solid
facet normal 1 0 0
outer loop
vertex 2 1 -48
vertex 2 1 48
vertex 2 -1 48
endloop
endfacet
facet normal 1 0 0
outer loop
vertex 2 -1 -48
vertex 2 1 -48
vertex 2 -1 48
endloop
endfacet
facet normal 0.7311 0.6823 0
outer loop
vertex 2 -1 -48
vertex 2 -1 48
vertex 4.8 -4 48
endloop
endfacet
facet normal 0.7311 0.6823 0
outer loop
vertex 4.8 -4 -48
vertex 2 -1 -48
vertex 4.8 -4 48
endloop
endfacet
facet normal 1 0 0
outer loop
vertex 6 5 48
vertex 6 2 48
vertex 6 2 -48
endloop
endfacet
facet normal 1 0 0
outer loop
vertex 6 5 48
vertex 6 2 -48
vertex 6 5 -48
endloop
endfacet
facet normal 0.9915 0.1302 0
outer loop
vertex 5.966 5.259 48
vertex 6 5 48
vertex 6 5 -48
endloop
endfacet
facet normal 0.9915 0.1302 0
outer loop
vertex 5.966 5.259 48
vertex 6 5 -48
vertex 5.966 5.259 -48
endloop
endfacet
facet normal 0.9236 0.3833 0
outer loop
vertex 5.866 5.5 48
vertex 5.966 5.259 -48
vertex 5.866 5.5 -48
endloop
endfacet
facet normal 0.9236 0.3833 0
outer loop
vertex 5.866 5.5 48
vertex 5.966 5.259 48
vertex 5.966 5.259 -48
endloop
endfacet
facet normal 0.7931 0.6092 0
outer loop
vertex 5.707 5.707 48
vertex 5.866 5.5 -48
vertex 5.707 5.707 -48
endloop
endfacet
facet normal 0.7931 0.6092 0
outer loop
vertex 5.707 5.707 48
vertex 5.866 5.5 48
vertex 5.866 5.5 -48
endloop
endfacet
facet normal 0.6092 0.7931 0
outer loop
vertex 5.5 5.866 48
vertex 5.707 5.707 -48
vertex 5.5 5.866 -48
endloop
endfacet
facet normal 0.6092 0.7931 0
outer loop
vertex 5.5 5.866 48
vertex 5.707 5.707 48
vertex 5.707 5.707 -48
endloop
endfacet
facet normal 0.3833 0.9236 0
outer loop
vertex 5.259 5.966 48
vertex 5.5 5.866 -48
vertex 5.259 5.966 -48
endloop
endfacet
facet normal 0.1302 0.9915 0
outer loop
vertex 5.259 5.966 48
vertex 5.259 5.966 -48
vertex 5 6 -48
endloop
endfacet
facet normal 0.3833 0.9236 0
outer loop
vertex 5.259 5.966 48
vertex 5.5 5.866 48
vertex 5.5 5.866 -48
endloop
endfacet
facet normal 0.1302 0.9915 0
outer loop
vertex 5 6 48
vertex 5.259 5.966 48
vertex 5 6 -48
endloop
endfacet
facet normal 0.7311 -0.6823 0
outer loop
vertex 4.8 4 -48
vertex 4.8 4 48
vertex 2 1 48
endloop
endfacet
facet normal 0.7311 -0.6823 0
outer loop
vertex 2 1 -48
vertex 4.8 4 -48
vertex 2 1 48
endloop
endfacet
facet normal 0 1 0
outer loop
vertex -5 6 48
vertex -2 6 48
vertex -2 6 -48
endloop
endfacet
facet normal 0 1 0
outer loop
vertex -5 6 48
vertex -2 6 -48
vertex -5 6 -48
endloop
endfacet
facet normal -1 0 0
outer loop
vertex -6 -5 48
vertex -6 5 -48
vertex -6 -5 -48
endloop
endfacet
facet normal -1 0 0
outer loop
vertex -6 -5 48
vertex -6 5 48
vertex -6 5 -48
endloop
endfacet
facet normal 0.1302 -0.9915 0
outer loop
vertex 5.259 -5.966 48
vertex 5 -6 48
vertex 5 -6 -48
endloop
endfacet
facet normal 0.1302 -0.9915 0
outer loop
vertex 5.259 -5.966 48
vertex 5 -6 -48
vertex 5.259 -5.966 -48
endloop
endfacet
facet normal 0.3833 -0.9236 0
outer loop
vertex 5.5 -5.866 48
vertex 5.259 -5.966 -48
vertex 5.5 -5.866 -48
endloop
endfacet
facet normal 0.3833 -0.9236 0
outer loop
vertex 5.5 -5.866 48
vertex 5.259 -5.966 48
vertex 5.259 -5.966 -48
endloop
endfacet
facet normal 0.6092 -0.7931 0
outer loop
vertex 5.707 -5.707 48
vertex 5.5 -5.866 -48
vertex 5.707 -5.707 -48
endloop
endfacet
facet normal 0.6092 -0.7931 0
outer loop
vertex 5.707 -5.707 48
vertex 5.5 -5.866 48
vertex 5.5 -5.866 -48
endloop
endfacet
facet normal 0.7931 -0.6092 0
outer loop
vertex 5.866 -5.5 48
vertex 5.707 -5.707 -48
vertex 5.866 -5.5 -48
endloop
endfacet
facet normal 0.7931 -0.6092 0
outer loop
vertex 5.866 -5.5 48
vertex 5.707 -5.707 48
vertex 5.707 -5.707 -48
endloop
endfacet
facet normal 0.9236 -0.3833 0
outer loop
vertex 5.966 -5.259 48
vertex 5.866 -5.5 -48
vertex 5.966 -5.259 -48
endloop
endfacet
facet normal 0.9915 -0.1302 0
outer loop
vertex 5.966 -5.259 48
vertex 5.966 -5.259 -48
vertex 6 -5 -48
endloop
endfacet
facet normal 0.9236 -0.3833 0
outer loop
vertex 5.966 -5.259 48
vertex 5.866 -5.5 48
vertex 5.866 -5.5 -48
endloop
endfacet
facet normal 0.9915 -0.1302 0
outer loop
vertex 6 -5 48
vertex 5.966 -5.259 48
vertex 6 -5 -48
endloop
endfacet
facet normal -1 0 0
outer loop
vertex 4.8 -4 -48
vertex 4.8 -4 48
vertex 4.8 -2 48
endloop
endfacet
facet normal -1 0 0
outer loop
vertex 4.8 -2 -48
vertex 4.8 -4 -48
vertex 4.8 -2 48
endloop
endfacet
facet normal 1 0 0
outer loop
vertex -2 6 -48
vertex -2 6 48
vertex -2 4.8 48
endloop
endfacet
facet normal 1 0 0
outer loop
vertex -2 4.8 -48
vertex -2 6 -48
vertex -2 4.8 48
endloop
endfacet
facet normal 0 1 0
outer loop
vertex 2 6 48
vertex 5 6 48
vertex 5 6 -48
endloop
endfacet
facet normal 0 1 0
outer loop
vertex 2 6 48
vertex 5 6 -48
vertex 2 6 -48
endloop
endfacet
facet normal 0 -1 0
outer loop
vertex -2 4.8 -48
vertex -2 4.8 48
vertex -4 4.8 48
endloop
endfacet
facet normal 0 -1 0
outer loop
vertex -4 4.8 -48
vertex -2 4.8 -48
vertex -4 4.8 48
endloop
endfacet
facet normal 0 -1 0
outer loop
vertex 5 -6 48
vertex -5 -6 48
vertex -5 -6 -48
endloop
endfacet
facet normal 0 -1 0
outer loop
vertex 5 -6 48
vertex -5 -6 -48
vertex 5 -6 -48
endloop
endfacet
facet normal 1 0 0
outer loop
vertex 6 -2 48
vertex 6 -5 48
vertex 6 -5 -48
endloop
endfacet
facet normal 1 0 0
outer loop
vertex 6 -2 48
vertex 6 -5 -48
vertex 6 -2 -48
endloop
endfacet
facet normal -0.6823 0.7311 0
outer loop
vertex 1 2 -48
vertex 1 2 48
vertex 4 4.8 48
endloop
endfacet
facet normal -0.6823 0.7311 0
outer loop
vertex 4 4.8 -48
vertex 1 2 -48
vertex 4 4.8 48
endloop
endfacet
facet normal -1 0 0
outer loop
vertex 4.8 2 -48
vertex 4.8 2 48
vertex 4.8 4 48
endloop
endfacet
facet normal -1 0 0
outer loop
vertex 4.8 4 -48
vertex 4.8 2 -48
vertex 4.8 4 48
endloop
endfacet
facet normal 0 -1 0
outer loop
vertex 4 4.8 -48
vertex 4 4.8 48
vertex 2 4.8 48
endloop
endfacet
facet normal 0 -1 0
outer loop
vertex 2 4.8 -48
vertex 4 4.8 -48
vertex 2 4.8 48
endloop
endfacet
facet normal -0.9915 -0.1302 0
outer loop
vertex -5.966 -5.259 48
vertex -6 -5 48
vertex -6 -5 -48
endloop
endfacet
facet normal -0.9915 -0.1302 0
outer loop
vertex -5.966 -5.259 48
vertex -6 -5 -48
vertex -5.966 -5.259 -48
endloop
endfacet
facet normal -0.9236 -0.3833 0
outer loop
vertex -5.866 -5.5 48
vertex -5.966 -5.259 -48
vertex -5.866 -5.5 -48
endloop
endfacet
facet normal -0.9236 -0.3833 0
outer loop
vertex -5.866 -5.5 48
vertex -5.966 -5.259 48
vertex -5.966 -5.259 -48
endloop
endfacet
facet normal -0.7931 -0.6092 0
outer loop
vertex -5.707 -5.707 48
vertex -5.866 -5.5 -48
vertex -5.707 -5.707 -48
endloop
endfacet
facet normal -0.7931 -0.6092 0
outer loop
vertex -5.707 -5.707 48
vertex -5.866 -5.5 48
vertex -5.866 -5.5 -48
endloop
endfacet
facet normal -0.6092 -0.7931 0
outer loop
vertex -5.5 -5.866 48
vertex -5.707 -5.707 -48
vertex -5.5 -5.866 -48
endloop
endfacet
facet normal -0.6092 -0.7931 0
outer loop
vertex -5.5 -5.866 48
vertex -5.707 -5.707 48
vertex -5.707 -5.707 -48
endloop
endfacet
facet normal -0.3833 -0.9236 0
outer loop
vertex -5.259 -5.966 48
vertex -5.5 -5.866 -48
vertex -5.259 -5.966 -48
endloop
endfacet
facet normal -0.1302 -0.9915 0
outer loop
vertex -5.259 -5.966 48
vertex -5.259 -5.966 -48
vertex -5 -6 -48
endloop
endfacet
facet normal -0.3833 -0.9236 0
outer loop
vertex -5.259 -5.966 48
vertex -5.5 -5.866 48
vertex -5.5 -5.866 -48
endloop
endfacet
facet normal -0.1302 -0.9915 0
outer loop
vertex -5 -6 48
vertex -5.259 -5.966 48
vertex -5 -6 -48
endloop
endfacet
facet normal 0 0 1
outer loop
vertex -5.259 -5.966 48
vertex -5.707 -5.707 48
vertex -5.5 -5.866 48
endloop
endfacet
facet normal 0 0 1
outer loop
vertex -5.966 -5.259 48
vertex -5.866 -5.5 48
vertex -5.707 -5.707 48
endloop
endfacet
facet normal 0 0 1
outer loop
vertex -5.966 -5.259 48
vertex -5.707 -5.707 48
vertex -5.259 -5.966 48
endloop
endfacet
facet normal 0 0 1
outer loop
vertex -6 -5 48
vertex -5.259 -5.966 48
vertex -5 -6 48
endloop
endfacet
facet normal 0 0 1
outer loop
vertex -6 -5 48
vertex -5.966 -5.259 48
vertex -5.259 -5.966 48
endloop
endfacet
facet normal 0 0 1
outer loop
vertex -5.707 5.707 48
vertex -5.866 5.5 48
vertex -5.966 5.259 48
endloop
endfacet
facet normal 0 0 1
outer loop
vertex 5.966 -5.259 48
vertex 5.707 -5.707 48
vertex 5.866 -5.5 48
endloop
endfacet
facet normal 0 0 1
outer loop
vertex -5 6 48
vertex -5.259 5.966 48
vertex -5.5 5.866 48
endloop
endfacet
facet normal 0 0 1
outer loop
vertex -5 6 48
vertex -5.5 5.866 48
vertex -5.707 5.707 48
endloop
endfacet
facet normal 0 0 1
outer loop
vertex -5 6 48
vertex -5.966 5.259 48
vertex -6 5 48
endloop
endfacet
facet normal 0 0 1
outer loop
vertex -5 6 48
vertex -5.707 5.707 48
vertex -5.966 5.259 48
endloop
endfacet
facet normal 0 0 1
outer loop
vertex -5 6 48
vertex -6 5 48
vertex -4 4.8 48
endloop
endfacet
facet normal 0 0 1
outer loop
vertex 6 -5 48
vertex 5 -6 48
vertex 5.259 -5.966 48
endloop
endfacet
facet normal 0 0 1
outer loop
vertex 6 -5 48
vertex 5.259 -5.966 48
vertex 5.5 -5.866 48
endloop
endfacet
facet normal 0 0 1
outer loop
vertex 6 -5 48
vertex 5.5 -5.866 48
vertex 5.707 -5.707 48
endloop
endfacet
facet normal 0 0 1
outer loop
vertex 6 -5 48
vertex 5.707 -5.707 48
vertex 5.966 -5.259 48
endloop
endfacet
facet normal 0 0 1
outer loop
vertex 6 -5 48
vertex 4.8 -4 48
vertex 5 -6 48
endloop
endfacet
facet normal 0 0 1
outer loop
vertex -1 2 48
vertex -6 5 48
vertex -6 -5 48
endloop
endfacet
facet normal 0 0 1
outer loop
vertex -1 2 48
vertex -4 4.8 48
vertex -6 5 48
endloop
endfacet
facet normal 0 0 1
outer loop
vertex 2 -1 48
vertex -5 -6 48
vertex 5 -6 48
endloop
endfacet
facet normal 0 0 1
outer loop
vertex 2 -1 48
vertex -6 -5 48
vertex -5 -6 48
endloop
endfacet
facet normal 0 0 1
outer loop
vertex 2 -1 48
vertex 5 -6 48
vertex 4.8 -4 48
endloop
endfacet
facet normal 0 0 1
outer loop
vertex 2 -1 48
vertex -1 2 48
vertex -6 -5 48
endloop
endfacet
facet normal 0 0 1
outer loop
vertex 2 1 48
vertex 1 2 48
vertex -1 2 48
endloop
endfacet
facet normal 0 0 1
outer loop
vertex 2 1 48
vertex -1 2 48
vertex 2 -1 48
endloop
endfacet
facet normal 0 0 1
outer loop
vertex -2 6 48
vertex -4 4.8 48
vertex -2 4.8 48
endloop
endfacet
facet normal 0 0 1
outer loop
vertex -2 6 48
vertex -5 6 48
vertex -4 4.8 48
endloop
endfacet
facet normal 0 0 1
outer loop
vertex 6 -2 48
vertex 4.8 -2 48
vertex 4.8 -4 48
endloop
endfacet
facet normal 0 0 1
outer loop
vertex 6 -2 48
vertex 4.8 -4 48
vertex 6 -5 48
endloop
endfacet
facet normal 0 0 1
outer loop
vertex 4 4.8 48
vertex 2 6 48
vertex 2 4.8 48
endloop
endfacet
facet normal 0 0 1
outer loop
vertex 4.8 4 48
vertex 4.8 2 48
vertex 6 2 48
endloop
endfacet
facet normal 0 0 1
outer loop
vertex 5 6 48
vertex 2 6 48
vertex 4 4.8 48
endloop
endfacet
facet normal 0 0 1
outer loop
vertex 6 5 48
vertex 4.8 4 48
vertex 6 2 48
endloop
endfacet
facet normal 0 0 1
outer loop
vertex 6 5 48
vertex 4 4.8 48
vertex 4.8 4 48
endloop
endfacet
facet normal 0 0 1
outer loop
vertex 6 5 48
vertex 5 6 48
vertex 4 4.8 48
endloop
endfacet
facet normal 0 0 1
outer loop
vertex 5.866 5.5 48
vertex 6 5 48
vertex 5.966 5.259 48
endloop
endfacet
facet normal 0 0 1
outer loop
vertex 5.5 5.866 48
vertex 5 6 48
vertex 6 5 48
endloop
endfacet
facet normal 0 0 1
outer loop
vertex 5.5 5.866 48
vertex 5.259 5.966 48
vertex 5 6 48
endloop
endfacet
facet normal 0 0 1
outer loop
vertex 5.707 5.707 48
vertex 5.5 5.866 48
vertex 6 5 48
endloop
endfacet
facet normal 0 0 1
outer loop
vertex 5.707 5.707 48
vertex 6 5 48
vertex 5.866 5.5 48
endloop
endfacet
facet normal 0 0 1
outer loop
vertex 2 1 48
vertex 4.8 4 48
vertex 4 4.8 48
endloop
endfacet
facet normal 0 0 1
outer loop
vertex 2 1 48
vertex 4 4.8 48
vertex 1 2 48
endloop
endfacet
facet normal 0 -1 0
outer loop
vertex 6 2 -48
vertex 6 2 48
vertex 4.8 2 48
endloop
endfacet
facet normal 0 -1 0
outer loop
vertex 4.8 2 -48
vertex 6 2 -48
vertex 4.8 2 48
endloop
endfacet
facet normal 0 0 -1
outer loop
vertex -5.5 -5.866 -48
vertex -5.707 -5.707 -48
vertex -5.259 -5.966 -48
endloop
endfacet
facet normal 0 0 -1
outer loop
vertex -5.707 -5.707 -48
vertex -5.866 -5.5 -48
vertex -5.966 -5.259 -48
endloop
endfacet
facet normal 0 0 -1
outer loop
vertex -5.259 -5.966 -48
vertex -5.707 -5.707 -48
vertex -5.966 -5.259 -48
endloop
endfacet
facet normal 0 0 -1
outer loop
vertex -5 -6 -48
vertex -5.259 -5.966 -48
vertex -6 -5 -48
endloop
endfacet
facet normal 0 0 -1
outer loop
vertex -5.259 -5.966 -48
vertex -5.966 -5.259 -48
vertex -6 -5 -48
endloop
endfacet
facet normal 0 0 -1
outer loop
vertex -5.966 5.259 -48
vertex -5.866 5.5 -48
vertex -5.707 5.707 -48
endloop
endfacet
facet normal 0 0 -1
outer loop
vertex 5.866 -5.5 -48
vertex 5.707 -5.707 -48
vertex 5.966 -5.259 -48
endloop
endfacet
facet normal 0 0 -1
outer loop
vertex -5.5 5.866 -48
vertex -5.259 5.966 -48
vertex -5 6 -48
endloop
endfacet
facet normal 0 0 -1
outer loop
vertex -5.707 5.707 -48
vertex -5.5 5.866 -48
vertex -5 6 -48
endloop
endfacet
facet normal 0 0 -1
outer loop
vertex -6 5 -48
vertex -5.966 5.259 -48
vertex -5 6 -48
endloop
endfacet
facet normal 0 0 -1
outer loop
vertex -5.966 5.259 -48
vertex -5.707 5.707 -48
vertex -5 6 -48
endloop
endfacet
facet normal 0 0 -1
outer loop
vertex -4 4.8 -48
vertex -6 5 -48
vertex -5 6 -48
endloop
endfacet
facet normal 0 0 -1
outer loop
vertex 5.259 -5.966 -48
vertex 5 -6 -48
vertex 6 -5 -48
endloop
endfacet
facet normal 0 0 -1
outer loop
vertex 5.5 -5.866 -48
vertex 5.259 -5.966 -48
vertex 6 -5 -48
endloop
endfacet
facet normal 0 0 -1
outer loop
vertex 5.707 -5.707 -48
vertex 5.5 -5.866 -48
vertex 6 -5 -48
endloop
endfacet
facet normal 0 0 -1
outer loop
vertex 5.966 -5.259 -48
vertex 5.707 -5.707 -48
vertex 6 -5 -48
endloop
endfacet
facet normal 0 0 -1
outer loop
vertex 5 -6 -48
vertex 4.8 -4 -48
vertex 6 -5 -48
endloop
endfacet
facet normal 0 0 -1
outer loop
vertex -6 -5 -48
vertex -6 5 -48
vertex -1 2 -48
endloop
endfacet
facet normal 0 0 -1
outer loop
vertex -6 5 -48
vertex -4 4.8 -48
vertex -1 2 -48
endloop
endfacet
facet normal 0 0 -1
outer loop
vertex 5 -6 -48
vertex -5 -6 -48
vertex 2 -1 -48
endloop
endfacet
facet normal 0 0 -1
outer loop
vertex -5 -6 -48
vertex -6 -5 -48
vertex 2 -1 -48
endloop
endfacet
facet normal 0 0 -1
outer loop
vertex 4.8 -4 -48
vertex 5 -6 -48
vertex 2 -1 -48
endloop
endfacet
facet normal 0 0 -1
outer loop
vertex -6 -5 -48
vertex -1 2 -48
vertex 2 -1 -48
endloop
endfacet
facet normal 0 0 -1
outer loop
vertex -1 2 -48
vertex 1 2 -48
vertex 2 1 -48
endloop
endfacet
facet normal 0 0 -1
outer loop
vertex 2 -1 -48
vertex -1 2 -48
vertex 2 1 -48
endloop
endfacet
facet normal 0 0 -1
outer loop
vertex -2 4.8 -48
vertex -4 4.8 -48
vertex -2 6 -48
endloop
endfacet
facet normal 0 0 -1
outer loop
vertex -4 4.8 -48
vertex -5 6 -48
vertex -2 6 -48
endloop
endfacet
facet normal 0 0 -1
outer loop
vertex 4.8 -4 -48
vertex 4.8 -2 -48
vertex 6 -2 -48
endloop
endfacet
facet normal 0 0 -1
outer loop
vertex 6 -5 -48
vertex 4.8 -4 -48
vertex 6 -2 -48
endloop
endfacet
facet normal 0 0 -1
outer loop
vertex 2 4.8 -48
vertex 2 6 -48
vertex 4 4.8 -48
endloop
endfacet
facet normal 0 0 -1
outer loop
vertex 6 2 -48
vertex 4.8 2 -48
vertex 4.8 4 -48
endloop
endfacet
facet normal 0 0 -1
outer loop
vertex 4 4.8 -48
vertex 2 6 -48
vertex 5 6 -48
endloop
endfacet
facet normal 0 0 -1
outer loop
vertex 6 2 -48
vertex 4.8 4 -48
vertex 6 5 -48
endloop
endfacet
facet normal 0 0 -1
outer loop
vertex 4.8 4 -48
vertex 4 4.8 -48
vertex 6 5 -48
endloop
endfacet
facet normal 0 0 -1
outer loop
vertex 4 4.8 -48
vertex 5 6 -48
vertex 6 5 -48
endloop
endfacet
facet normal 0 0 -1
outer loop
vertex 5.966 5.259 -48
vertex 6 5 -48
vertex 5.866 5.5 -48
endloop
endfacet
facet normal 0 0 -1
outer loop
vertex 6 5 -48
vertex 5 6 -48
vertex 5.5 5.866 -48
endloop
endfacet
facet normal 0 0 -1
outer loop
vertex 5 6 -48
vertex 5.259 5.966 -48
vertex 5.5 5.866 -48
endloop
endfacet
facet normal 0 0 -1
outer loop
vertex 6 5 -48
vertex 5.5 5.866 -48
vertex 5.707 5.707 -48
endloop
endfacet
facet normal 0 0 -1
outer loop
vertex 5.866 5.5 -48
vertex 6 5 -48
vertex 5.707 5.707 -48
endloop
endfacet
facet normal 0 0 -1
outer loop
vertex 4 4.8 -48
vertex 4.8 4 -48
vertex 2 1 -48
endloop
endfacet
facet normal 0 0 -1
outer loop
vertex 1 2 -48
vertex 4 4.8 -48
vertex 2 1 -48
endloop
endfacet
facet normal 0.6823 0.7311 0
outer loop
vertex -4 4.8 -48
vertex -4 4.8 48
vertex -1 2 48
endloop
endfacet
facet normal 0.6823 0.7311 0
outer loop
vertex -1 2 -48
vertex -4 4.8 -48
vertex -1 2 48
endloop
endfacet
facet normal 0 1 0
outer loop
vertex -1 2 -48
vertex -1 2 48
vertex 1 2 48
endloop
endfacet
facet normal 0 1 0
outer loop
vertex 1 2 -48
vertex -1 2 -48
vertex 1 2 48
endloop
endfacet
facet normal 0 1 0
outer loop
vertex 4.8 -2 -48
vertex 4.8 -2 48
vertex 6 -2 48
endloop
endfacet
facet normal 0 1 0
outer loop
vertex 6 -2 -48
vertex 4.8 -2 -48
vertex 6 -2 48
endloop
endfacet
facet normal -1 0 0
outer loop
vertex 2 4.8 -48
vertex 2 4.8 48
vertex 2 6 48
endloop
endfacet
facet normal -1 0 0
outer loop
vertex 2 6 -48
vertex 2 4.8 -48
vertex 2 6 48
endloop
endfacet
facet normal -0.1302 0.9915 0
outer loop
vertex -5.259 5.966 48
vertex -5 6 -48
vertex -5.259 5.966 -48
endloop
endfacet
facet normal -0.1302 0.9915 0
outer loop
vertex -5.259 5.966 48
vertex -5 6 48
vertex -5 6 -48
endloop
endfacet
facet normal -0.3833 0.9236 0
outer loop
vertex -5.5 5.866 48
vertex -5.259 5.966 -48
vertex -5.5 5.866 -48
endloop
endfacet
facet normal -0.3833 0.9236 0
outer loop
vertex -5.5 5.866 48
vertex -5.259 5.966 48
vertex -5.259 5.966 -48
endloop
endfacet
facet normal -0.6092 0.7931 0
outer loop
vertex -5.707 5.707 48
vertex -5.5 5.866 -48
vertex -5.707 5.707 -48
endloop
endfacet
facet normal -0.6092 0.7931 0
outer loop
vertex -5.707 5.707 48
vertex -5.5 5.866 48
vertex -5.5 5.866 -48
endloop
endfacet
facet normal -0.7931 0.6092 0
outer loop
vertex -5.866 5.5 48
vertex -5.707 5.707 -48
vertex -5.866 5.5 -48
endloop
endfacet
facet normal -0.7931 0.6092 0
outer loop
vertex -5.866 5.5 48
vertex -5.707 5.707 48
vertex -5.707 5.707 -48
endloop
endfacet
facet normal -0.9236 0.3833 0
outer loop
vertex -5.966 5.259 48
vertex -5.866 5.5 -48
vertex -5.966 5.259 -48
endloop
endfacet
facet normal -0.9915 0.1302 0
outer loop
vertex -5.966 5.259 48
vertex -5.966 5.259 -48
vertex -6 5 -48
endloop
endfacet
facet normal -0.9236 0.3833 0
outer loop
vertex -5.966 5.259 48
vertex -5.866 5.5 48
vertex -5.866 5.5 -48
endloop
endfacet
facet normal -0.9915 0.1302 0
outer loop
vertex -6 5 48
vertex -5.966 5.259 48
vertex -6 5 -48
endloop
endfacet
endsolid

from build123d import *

# Parameters (mm, degrees)
EXTRUSION1_DEPTH             = 48
ENL_V_MAT_EXTRU_1_DEPTH      = 97.374270425
R_P_TITION_CIRCULAIRE1_COUNT = 2
R_P_TITION_CIRCULAIRE1_ANGLE = 90


with BuildPart() as part:
    # Esquisse1 → Extrusion1 (new, symmetric)
    with BuildSketch(Plane.XY):
        with BuildLine():
            Line((-6, 5), (-6, -5))
            ThreePointArc((-6, -5), (-5.707106781, -5.707106781), (-5, -6))
            Line((-5, -6), (5, -6))
            ThreePointArc((5, -6), (5.707106781, -5.707106781), (6, -5))
            Line((6, -5), (6, 5))
            ThreePointArc((6, 5), (5.707106781, 5.707106781), (5, 6))
            Line((5, 6), (-5, 6))
            ThreePointArc((-5, 6), (-5.707106781, 5.707106781), (-6, 5))
        make_face()
    extrude(amount=EXTRUSION1_DEPTH, both=True)

    # Esquisse3 → Enlèv. mat.-Extru.1 (cut, through all)
    with BuildSketch(Plane.XY.offset(48)):
        Polygon((6, 2), (4.8, 2), (4.8, 4), (2, 1), (2, -1), (4.8, -4), (4.8, -2), (6, -2), align=None)
    enl_v_mat_extru_1 = extrude(amount=-ENL_V_MAT_EXTRU_1_DEPTH, mode=Mode.SUBTRACT)

    # Répétition circulaire1: Enlèv. mat.-Extru.1 ×2 about axis
    r_p_tition_circulaire1_axis = Axis((0, 0, -1), (0, 0, 1))
    for i in range(1, R_P_TITION_CIRCULAIRE1_COUNT):
        add(enl_v_mat_extru_1.rotate(r_p_tition_circulaire1_axis, i * R_P_TITION_CIRCULAIRE1_ANGLE / (R_P_TITION_CIRCULAIRE1_COUNT - 1)), mode=Mode.SUBTRACT)


solid = part.part
